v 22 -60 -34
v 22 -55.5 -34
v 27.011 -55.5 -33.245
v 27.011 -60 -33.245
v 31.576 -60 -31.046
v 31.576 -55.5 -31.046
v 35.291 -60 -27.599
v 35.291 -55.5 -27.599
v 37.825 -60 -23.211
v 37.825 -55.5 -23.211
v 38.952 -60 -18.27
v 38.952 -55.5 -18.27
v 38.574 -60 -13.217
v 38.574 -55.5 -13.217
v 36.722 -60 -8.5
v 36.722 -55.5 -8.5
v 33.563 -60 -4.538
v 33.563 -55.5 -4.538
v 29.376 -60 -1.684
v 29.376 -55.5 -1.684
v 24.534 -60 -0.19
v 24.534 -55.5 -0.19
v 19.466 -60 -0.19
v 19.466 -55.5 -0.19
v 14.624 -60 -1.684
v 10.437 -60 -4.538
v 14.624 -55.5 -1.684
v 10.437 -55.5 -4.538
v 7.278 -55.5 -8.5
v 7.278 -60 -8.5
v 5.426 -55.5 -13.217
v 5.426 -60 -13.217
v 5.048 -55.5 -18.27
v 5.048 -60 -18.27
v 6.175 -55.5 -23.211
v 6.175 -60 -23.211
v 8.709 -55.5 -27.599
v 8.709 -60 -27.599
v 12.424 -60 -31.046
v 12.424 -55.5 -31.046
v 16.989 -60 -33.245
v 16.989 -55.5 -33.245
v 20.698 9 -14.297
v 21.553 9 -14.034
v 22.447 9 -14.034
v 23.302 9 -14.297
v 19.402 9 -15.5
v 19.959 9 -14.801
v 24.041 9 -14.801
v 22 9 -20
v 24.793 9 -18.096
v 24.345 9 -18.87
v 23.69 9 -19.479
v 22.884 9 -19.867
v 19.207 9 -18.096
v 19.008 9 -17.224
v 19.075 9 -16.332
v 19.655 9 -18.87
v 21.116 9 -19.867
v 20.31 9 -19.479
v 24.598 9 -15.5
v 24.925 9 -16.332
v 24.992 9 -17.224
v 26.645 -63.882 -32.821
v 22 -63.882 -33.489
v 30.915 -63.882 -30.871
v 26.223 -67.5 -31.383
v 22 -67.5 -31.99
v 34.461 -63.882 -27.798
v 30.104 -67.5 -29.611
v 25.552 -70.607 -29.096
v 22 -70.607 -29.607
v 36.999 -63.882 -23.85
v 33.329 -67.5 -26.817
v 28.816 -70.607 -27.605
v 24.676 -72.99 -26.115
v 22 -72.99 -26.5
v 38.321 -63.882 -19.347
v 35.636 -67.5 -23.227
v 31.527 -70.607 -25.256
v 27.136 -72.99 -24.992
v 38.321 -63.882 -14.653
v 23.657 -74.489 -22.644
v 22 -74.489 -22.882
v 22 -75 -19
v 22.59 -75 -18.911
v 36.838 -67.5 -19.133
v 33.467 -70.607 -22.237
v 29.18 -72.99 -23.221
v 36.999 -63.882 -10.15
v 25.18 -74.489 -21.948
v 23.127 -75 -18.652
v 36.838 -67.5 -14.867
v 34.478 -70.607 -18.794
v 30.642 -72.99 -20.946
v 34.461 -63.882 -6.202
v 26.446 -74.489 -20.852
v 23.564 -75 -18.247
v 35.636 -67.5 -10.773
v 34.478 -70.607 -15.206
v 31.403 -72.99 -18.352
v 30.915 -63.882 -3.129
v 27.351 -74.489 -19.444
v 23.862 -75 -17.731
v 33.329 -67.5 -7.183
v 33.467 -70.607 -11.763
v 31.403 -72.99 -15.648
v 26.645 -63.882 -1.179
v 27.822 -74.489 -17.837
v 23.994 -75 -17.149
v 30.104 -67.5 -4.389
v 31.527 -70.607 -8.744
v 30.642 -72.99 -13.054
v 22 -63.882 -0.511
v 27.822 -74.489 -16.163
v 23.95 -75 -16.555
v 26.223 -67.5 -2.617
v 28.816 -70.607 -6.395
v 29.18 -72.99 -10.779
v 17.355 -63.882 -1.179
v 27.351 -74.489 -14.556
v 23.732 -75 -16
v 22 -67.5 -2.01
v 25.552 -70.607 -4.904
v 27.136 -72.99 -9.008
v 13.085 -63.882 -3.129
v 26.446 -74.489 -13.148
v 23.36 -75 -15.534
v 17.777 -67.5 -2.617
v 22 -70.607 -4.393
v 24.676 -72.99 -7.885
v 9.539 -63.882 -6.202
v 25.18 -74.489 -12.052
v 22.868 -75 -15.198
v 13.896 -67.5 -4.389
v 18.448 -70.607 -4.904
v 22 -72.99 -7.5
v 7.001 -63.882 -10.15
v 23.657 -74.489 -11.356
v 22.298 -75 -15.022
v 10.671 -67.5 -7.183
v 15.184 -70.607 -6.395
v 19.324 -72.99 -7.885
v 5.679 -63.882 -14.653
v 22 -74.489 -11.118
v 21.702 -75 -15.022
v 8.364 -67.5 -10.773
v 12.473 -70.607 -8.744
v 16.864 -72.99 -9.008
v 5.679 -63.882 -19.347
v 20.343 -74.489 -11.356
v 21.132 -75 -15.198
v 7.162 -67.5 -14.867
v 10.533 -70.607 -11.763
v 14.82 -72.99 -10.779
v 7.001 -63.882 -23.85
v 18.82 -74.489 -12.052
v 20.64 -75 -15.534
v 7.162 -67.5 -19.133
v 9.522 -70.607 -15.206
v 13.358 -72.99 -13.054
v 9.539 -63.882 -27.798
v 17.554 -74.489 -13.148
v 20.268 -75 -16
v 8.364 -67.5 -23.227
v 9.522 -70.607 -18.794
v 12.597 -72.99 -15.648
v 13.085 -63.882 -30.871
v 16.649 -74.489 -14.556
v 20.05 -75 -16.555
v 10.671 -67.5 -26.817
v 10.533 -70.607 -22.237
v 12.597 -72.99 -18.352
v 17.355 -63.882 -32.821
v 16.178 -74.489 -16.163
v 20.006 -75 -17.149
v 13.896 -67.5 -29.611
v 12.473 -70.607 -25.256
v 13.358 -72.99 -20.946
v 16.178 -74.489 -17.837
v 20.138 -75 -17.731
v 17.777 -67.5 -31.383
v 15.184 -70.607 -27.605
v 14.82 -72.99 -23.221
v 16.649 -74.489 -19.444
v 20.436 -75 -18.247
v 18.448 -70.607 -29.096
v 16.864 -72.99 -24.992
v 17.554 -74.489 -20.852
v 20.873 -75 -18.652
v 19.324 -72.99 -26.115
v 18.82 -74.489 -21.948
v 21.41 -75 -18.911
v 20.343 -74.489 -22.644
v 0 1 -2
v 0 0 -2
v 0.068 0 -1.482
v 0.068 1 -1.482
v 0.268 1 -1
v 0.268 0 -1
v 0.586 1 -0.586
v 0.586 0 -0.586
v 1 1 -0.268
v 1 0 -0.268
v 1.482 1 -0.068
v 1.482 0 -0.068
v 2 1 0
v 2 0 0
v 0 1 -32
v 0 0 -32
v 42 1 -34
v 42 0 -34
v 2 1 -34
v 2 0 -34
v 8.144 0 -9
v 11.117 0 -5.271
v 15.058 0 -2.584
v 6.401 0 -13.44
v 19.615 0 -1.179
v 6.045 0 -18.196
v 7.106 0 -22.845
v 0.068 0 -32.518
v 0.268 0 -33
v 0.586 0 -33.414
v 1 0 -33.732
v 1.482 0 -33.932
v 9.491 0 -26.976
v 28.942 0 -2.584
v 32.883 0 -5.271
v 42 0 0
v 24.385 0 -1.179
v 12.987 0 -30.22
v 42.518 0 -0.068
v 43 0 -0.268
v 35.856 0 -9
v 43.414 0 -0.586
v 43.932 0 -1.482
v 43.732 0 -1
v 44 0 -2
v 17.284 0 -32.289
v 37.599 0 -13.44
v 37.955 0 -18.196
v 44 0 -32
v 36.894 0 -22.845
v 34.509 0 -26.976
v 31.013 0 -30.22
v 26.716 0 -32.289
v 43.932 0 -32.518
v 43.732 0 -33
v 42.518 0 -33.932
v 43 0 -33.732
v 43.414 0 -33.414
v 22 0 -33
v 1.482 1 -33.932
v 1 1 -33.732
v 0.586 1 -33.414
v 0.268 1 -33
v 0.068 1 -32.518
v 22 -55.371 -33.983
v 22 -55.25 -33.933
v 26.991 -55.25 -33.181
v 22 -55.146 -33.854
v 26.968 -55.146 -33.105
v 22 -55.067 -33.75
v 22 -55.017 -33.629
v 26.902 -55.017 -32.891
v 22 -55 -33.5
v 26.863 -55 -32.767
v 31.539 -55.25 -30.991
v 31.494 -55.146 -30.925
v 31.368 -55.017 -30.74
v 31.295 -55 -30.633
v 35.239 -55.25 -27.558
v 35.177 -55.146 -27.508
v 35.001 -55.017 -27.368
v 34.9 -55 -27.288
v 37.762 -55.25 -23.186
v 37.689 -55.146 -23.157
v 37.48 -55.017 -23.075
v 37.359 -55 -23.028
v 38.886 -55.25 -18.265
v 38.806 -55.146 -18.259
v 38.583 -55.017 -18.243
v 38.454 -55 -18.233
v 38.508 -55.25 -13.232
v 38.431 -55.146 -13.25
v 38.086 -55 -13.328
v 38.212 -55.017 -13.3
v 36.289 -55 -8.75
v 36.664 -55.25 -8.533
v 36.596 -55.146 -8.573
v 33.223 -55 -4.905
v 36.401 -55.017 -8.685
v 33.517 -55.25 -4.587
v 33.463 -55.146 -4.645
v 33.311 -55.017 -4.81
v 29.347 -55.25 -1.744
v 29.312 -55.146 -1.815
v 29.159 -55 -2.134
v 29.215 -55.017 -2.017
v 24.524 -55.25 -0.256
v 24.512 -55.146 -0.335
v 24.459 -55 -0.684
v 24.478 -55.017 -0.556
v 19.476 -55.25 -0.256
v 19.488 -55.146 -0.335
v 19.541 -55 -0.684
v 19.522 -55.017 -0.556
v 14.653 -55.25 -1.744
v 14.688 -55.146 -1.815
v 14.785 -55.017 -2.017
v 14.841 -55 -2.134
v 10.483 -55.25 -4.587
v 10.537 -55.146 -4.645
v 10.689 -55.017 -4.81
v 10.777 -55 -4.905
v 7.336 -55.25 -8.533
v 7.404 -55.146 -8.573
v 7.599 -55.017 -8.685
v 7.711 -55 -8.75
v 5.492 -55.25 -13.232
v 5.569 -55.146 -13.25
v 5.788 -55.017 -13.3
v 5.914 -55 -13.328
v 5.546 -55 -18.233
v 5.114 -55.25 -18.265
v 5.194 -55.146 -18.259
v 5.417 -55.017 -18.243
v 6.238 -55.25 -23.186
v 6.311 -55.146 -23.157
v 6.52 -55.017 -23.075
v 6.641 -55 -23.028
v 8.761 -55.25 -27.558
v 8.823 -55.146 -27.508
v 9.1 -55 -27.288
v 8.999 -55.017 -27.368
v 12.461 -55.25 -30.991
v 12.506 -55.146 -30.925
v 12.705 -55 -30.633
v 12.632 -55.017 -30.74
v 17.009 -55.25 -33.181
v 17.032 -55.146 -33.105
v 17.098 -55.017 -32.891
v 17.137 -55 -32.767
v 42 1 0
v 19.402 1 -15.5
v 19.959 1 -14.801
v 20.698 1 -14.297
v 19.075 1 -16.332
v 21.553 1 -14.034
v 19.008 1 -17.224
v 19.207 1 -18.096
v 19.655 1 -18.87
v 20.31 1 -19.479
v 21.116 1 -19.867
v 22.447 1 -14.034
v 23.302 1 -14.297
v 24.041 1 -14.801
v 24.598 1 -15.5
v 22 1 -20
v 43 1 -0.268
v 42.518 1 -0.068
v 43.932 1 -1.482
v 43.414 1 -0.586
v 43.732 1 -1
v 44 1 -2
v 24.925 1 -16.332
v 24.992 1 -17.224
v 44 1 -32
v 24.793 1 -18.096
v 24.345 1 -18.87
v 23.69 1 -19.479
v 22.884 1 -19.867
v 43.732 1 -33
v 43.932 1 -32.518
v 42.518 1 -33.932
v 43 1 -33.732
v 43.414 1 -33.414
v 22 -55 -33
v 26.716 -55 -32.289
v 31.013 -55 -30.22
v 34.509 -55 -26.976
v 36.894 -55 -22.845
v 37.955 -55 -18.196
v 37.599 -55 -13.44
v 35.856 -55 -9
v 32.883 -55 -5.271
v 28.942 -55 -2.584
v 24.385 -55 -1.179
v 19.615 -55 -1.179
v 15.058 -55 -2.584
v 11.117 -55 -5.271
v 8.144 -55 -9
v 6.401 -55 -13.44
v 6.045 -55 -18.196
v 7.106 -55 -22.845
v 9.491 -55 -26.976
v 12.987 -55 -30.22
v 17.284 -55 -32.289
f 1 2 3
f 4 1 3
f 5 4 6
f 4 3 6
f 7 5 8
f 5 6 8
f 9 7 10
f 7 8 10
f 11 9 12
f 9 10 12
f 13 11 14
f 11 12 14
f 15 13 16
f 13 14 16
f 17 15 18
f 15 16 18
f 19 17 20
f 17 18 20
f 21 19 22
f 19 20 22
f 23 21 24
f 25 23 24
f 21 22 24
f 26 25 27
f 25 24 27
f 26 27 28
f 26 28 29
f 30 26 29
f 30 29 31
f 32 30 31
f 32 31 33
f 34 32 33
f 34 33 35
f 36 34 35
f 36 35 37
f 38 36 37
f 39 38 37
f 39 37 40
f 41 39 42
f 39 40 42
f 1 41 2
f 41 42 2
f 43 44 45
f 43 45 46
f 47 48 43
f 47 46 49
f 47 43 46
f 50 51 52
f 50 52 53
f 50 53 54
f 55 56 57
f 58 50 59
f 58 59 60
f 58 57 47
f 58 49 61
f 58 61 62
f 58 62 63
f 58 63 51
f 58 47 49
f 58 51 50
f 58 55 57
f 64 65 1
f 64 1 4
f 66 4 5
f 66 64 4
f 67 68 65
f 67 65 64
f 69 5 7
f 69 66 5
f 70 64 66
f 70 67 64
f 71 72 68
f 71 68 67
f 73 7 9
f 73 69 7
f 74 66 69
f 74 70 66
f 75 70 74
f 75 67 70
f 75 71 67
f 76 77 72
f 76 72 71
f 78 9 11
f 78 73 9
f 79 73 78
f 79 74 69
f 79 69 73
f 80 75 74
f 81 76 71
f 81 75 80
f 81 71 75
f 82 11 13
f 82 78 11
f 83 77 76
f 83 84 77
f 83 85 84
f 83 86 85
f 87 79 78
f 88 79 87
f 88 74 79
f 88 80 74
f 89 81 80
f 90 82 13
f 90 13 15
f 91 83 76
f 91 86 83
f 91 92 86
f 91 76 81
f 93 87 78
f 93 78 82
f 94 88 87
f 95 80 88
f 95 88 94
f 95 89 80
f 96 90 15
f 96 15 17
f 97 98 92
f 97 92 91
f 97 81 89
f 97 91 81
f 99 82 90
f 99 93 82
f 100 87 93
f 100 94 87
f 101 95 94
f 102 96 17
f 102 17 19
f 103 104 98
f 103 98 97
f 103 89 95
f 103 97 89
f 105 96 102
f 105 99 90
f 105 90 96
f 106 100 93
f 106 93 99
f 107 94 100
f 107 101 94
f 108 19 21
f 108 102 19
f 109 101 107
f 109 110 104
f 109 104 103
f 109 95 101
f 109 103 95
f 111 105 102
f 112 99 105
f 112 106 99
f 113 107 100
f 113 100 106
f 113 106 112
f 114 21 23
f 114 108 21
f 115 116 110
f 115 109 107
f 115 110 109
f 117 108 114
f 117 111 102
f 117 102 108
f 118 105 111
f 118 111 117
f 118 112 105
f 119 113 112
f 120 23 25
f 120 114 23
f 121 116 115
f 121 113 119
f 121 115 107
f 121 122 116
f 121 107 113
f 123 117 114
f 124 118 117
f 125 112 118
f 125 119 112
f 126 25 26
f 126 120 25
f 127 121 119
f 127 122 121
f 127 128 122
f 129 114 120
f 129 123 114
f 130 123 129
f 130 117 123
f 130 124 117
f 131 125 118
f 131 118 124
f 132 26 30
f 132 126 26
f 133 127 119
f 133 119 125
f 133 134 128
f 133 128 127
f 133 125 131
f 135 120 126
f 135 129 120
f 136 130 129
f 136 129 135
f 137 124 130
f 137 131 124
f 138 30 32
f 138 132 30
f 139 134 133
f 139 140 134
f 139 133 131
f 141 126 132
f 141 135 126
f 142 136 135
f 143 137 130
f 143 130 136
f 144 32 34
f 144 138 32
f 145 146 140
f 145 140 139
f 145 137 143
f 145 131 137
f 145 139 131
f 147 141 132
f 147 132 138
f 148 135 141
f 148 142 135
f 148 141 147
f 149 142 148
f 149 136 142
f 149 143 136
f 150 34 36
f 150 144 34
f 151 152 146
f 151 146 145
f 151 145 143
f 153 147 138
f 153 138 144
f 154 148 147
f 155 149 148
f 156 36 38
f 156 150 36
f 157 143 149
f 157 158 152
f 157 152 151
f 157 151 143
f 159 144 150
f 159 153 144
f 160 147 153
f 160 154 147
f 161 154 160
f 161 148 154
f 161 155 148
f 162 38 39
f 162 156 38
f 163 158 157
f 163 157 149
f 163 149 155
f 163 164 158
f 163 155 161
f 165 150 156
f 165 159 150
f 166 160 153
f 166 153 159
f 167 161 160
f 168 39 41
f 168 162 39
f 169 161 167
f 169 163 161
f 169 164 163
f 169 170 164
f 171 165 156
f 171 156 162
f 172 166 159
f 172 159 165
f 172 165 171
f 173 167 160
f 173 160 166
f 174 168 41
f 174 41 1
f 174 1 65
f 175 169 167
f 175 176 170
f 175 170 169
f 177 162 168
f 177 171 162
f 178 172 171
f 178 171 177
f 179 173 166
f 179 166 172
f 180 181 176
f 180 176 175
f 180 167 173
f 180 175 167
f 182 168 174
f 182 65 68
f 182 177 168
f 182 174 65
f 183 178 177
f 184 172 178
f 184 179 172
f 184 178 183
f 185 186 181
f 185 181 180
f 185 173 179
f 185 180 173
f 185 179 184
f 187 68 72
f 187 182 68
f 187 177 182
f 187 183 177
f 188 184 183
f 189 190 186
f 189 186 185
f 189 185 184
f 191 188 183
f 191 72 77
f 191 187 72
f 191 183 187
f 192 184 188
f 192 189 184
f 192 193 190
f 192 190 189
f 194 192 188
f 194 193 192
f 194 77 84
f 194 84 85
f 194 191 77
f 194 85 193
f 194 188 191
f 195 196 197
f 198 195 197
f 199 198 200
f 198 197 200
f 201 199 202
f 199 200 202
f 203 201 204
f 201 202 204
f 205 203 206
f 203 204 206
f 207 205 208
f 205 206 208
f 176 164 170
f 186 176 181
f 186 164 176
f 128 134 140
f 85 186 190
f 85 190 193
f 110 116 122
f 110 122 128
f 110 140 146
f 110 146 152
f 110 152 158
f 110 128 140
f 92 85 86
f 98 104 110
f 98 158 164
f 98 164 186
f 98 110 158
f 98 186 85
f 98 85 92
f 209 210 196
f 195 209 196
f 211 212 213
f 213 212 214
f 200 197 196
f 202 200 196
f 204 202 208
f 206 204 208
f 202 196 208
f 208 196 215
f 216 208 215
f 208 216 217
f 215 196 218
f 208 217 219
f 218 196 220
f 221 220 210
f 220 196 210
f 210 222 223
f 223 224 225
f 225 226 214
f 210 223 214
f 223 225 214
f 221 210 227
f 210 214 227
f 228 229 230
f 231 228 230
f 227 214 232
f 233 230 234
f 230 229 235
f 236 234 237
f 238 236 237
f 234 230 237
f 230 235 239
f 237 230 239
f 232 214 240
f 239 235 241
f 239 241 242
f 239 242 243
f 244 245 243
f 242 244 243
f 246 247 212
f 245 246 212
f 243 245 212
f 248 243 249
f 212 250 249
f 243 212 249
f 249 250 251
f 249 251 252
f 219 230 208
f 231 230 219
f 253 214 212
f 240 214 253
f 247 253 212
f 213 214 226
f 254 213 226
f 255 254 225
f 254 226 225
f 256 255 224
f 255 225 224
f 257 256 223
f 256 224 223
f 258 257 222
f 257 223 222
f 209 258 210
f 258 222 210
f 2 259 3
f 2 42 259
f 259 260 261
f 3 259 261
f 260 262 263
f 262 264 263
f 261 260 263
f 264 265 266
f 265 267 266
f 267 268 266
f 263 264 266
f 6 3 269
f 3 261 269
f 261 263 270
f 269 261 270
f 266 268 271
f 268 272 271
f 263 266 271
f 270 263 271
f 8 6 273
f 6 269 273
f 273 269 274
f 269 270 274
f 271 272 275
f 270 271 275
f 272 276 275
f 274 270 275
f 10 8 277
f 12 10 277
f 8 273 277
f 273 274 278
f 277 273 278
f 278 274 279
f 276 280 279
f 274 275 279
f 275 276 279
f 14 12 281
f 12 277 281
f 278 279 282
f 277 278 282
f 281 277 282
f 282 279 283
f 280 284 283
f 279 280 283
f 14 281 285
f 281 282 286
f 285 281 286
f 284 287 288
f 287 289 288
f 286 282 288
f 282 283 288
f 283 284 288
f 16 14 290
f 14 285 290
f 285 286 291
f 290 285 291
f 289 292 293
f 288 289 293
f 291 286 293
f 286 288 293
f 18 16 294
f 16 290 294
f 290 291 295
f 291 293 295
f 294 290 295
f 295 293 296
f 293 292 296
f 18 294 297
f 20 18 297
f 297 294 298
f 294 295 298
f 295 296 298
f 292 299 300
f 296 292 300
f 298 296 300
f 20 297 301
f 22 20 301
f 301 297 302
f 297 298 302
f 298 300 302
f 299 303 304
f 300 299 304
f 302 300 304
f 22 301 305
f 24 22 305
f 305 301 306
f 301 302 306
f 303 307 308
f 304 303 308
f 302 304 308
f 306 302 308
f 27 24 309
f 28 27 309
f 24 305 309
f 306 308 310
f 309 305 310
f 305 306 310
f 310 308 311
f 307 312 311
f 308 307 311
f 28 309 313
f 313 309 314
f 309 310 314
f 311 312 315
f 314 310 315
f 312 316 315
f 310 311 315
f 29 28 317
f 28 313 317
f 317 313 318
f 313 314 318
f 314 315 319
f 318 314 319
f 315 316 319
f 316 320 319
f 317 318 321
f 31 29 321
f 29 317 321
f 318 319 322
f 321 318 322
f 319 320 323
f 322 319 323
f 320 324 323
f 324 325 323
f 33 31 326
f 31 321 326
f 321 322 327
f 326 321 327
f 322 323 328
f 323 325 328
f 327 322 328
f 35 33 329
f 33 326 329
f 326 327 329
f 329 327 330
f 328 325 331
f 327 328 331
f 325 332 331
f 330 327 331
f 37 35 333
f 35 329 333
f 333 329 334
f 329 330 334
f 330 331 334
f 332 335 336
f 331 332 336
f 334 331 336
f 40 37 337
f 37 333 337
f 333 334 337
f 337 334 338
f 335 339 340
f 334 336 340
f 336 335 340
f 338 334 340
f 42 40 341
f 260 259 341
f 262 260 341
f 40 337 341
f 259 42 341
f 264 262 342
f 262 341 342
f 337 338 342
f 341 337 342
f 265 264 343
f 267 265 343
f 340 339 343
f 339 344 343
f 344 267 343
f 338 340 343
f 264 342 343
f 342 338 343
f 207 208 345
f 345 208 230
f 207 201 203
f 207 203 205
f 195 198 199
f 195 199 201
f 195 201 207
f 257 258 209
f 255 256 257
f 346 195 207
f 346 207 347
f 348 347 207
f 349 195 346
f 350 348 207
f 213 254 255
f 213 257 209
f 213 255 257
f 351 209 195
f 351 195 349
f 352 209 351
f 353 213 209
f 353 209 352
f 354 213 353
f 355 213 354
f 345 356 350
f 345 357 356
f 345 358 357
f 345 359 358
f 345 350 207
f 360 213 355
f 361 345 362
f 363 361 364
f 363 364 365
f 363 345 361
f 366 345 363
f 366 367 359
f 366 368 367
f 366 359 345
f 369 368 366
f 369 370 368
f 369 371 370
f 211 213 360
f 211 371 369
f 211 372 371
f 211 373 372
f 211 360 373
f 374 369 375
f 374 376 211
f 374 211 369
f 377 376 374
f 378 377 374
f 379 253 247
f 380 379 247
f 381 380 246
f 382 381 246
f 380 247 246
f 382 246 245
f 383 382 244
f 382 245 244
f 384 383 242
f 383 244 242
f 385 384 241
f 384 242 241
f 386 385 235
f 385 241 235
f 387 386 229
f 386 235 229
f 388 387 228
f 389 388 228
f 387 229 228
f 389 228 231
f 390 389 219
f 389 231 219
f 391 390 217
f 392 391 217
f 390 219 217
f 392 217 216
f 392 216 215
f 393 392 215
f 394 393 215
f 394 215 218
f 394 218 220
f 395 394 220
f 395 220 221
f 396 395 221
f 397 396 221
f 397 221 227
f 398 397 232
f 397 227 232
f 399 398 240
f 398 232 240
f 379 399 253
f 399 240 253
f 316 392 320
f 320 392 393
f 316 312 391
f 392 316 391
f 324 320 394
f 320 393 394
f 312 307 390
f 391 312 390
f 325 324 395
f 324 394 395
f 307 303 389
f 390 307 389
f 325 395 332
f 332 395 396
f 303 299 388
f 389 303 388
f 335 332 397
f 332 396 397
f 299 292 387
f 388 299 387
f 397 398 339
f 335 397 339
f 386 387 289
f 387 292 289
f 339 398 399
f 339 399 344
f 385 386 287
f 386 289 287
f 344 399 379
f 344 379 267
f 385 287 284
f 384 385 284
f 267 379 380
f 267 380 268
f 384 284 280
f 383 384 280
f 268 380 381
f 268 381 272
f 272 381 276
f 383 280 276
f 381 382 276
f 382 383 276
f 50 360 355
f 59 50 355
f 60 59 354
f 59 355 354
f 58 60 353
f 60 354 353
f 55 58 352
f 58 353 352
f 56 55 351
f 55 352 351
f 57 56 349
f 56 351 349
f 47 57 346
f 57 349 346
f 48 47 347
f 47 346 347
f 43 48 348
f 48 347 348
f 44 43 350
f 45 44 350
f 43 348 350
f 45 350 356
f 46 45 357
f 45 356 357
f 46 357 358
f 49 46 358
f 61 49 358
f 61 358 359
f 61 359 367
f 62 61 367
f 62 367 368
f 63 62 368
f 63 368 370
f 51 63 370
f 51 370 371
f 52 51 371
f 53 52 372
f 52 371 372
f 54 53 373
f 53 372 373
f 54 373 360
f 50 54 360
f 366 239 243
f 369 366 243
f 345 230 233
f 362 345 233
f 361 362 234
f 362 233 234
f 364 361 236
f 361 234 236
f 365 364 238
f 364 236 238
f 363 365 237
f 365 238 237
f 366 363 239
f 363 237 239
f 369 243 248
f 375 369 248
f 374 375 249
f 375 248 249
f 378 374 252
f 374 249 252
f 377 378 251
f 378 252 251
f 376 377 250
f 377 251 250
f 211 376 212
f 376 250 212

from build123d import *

# Parameters (mm, degrees)
BOSS_EXTRU_1_DEPTH = 1
ESQUISSE2_R        = 16
BOSS_EXTRU_2_DEPTH = 55
ESQUISSE3_R        = 17
BOSS_EXTRU_3_DEPTH = 20
CONG_1_R           = 15
CONG_2_R           = 0.5
ESQUISSE4_R        = 3
BOSS_EXTRU_4_DEPTH = 8


with BuildPart() as part:
    # Esquisse1 → Boss.-Extru.1 (new body)
    with BuildSketch(Plane(origin=(0, 0, 0), x_dir=(1, 0, 0), z_dir=(0, 1, 0))):
        with BuildLine():
            Line((2, 0), (42, 0))
            ThreePointArc((42, 0), (43.414213562, 0.585786438), (44, 2))
            Line((44, 2), (44, 32))
            ThreePointArc((44, 32), (43.414213562, 33.414213562), (42, 34))
            Line((42, 34), (2, 34))
            ThreePointArc((2, 34), (0.585786438, 33.414213562), (0, 32))
            Line((0, 32), (0, 2))
            ThreePointArc((0, 2), (0.585786438, 0.585786438), (2, 0))
        make_face()
    extrude(amount=BOSS_EXTRU_1_DEPTH)

    # Esquisse2 → Boss.-Extru.2 (add)
    with BuildSketch(Plane.XZ):
        with Locations(Location((22, -17, 0), (0, 0, 270))):
            Circle(ESQUISSE2_R)
    extrude(amount=BOSS_EXTRU_2_DEPTH)

    # Esquisse3 → Boss.-Extru.3 (add)
    with BuildSketch(Plane.XZ.offset(55)):
        with Locations(Location((22, -17, 0), (0, 0, 270))):
            Circle(ESQUISSE3_R)
    extrude(amount=BOSS_EXTRU_3_DEPTH)

    # Congé1
    cong_1_edges = [part.edges().sort_by_distance(p)[0] for p in [
        (22, -75, 0),
    ]]
    fillet(cong_1_edges, radius=CONG_1_R)

    # Congé2
    cong_2_edges = [part.edges().sort_by_distance(p)[0] for p in [
        (22, -55, 0),
    ]]
    fillet(cong_2_edges, radius=CONG_2_R)

    # Esquisse4 → Boss.-Extru.4 (add)
    with BuildSketch(Plane(origin=(0, 1, 0), x_dir=(1, 0, 0), z_dir=(0, 1, 0))):
        with Locations(Location((22, 17, 0), (0, 0, 90))):
            Circle(ESQUISSE4_R)
    extrude(amount=BOSS_EXTRU_4_DEPTH)


solid = part.part
